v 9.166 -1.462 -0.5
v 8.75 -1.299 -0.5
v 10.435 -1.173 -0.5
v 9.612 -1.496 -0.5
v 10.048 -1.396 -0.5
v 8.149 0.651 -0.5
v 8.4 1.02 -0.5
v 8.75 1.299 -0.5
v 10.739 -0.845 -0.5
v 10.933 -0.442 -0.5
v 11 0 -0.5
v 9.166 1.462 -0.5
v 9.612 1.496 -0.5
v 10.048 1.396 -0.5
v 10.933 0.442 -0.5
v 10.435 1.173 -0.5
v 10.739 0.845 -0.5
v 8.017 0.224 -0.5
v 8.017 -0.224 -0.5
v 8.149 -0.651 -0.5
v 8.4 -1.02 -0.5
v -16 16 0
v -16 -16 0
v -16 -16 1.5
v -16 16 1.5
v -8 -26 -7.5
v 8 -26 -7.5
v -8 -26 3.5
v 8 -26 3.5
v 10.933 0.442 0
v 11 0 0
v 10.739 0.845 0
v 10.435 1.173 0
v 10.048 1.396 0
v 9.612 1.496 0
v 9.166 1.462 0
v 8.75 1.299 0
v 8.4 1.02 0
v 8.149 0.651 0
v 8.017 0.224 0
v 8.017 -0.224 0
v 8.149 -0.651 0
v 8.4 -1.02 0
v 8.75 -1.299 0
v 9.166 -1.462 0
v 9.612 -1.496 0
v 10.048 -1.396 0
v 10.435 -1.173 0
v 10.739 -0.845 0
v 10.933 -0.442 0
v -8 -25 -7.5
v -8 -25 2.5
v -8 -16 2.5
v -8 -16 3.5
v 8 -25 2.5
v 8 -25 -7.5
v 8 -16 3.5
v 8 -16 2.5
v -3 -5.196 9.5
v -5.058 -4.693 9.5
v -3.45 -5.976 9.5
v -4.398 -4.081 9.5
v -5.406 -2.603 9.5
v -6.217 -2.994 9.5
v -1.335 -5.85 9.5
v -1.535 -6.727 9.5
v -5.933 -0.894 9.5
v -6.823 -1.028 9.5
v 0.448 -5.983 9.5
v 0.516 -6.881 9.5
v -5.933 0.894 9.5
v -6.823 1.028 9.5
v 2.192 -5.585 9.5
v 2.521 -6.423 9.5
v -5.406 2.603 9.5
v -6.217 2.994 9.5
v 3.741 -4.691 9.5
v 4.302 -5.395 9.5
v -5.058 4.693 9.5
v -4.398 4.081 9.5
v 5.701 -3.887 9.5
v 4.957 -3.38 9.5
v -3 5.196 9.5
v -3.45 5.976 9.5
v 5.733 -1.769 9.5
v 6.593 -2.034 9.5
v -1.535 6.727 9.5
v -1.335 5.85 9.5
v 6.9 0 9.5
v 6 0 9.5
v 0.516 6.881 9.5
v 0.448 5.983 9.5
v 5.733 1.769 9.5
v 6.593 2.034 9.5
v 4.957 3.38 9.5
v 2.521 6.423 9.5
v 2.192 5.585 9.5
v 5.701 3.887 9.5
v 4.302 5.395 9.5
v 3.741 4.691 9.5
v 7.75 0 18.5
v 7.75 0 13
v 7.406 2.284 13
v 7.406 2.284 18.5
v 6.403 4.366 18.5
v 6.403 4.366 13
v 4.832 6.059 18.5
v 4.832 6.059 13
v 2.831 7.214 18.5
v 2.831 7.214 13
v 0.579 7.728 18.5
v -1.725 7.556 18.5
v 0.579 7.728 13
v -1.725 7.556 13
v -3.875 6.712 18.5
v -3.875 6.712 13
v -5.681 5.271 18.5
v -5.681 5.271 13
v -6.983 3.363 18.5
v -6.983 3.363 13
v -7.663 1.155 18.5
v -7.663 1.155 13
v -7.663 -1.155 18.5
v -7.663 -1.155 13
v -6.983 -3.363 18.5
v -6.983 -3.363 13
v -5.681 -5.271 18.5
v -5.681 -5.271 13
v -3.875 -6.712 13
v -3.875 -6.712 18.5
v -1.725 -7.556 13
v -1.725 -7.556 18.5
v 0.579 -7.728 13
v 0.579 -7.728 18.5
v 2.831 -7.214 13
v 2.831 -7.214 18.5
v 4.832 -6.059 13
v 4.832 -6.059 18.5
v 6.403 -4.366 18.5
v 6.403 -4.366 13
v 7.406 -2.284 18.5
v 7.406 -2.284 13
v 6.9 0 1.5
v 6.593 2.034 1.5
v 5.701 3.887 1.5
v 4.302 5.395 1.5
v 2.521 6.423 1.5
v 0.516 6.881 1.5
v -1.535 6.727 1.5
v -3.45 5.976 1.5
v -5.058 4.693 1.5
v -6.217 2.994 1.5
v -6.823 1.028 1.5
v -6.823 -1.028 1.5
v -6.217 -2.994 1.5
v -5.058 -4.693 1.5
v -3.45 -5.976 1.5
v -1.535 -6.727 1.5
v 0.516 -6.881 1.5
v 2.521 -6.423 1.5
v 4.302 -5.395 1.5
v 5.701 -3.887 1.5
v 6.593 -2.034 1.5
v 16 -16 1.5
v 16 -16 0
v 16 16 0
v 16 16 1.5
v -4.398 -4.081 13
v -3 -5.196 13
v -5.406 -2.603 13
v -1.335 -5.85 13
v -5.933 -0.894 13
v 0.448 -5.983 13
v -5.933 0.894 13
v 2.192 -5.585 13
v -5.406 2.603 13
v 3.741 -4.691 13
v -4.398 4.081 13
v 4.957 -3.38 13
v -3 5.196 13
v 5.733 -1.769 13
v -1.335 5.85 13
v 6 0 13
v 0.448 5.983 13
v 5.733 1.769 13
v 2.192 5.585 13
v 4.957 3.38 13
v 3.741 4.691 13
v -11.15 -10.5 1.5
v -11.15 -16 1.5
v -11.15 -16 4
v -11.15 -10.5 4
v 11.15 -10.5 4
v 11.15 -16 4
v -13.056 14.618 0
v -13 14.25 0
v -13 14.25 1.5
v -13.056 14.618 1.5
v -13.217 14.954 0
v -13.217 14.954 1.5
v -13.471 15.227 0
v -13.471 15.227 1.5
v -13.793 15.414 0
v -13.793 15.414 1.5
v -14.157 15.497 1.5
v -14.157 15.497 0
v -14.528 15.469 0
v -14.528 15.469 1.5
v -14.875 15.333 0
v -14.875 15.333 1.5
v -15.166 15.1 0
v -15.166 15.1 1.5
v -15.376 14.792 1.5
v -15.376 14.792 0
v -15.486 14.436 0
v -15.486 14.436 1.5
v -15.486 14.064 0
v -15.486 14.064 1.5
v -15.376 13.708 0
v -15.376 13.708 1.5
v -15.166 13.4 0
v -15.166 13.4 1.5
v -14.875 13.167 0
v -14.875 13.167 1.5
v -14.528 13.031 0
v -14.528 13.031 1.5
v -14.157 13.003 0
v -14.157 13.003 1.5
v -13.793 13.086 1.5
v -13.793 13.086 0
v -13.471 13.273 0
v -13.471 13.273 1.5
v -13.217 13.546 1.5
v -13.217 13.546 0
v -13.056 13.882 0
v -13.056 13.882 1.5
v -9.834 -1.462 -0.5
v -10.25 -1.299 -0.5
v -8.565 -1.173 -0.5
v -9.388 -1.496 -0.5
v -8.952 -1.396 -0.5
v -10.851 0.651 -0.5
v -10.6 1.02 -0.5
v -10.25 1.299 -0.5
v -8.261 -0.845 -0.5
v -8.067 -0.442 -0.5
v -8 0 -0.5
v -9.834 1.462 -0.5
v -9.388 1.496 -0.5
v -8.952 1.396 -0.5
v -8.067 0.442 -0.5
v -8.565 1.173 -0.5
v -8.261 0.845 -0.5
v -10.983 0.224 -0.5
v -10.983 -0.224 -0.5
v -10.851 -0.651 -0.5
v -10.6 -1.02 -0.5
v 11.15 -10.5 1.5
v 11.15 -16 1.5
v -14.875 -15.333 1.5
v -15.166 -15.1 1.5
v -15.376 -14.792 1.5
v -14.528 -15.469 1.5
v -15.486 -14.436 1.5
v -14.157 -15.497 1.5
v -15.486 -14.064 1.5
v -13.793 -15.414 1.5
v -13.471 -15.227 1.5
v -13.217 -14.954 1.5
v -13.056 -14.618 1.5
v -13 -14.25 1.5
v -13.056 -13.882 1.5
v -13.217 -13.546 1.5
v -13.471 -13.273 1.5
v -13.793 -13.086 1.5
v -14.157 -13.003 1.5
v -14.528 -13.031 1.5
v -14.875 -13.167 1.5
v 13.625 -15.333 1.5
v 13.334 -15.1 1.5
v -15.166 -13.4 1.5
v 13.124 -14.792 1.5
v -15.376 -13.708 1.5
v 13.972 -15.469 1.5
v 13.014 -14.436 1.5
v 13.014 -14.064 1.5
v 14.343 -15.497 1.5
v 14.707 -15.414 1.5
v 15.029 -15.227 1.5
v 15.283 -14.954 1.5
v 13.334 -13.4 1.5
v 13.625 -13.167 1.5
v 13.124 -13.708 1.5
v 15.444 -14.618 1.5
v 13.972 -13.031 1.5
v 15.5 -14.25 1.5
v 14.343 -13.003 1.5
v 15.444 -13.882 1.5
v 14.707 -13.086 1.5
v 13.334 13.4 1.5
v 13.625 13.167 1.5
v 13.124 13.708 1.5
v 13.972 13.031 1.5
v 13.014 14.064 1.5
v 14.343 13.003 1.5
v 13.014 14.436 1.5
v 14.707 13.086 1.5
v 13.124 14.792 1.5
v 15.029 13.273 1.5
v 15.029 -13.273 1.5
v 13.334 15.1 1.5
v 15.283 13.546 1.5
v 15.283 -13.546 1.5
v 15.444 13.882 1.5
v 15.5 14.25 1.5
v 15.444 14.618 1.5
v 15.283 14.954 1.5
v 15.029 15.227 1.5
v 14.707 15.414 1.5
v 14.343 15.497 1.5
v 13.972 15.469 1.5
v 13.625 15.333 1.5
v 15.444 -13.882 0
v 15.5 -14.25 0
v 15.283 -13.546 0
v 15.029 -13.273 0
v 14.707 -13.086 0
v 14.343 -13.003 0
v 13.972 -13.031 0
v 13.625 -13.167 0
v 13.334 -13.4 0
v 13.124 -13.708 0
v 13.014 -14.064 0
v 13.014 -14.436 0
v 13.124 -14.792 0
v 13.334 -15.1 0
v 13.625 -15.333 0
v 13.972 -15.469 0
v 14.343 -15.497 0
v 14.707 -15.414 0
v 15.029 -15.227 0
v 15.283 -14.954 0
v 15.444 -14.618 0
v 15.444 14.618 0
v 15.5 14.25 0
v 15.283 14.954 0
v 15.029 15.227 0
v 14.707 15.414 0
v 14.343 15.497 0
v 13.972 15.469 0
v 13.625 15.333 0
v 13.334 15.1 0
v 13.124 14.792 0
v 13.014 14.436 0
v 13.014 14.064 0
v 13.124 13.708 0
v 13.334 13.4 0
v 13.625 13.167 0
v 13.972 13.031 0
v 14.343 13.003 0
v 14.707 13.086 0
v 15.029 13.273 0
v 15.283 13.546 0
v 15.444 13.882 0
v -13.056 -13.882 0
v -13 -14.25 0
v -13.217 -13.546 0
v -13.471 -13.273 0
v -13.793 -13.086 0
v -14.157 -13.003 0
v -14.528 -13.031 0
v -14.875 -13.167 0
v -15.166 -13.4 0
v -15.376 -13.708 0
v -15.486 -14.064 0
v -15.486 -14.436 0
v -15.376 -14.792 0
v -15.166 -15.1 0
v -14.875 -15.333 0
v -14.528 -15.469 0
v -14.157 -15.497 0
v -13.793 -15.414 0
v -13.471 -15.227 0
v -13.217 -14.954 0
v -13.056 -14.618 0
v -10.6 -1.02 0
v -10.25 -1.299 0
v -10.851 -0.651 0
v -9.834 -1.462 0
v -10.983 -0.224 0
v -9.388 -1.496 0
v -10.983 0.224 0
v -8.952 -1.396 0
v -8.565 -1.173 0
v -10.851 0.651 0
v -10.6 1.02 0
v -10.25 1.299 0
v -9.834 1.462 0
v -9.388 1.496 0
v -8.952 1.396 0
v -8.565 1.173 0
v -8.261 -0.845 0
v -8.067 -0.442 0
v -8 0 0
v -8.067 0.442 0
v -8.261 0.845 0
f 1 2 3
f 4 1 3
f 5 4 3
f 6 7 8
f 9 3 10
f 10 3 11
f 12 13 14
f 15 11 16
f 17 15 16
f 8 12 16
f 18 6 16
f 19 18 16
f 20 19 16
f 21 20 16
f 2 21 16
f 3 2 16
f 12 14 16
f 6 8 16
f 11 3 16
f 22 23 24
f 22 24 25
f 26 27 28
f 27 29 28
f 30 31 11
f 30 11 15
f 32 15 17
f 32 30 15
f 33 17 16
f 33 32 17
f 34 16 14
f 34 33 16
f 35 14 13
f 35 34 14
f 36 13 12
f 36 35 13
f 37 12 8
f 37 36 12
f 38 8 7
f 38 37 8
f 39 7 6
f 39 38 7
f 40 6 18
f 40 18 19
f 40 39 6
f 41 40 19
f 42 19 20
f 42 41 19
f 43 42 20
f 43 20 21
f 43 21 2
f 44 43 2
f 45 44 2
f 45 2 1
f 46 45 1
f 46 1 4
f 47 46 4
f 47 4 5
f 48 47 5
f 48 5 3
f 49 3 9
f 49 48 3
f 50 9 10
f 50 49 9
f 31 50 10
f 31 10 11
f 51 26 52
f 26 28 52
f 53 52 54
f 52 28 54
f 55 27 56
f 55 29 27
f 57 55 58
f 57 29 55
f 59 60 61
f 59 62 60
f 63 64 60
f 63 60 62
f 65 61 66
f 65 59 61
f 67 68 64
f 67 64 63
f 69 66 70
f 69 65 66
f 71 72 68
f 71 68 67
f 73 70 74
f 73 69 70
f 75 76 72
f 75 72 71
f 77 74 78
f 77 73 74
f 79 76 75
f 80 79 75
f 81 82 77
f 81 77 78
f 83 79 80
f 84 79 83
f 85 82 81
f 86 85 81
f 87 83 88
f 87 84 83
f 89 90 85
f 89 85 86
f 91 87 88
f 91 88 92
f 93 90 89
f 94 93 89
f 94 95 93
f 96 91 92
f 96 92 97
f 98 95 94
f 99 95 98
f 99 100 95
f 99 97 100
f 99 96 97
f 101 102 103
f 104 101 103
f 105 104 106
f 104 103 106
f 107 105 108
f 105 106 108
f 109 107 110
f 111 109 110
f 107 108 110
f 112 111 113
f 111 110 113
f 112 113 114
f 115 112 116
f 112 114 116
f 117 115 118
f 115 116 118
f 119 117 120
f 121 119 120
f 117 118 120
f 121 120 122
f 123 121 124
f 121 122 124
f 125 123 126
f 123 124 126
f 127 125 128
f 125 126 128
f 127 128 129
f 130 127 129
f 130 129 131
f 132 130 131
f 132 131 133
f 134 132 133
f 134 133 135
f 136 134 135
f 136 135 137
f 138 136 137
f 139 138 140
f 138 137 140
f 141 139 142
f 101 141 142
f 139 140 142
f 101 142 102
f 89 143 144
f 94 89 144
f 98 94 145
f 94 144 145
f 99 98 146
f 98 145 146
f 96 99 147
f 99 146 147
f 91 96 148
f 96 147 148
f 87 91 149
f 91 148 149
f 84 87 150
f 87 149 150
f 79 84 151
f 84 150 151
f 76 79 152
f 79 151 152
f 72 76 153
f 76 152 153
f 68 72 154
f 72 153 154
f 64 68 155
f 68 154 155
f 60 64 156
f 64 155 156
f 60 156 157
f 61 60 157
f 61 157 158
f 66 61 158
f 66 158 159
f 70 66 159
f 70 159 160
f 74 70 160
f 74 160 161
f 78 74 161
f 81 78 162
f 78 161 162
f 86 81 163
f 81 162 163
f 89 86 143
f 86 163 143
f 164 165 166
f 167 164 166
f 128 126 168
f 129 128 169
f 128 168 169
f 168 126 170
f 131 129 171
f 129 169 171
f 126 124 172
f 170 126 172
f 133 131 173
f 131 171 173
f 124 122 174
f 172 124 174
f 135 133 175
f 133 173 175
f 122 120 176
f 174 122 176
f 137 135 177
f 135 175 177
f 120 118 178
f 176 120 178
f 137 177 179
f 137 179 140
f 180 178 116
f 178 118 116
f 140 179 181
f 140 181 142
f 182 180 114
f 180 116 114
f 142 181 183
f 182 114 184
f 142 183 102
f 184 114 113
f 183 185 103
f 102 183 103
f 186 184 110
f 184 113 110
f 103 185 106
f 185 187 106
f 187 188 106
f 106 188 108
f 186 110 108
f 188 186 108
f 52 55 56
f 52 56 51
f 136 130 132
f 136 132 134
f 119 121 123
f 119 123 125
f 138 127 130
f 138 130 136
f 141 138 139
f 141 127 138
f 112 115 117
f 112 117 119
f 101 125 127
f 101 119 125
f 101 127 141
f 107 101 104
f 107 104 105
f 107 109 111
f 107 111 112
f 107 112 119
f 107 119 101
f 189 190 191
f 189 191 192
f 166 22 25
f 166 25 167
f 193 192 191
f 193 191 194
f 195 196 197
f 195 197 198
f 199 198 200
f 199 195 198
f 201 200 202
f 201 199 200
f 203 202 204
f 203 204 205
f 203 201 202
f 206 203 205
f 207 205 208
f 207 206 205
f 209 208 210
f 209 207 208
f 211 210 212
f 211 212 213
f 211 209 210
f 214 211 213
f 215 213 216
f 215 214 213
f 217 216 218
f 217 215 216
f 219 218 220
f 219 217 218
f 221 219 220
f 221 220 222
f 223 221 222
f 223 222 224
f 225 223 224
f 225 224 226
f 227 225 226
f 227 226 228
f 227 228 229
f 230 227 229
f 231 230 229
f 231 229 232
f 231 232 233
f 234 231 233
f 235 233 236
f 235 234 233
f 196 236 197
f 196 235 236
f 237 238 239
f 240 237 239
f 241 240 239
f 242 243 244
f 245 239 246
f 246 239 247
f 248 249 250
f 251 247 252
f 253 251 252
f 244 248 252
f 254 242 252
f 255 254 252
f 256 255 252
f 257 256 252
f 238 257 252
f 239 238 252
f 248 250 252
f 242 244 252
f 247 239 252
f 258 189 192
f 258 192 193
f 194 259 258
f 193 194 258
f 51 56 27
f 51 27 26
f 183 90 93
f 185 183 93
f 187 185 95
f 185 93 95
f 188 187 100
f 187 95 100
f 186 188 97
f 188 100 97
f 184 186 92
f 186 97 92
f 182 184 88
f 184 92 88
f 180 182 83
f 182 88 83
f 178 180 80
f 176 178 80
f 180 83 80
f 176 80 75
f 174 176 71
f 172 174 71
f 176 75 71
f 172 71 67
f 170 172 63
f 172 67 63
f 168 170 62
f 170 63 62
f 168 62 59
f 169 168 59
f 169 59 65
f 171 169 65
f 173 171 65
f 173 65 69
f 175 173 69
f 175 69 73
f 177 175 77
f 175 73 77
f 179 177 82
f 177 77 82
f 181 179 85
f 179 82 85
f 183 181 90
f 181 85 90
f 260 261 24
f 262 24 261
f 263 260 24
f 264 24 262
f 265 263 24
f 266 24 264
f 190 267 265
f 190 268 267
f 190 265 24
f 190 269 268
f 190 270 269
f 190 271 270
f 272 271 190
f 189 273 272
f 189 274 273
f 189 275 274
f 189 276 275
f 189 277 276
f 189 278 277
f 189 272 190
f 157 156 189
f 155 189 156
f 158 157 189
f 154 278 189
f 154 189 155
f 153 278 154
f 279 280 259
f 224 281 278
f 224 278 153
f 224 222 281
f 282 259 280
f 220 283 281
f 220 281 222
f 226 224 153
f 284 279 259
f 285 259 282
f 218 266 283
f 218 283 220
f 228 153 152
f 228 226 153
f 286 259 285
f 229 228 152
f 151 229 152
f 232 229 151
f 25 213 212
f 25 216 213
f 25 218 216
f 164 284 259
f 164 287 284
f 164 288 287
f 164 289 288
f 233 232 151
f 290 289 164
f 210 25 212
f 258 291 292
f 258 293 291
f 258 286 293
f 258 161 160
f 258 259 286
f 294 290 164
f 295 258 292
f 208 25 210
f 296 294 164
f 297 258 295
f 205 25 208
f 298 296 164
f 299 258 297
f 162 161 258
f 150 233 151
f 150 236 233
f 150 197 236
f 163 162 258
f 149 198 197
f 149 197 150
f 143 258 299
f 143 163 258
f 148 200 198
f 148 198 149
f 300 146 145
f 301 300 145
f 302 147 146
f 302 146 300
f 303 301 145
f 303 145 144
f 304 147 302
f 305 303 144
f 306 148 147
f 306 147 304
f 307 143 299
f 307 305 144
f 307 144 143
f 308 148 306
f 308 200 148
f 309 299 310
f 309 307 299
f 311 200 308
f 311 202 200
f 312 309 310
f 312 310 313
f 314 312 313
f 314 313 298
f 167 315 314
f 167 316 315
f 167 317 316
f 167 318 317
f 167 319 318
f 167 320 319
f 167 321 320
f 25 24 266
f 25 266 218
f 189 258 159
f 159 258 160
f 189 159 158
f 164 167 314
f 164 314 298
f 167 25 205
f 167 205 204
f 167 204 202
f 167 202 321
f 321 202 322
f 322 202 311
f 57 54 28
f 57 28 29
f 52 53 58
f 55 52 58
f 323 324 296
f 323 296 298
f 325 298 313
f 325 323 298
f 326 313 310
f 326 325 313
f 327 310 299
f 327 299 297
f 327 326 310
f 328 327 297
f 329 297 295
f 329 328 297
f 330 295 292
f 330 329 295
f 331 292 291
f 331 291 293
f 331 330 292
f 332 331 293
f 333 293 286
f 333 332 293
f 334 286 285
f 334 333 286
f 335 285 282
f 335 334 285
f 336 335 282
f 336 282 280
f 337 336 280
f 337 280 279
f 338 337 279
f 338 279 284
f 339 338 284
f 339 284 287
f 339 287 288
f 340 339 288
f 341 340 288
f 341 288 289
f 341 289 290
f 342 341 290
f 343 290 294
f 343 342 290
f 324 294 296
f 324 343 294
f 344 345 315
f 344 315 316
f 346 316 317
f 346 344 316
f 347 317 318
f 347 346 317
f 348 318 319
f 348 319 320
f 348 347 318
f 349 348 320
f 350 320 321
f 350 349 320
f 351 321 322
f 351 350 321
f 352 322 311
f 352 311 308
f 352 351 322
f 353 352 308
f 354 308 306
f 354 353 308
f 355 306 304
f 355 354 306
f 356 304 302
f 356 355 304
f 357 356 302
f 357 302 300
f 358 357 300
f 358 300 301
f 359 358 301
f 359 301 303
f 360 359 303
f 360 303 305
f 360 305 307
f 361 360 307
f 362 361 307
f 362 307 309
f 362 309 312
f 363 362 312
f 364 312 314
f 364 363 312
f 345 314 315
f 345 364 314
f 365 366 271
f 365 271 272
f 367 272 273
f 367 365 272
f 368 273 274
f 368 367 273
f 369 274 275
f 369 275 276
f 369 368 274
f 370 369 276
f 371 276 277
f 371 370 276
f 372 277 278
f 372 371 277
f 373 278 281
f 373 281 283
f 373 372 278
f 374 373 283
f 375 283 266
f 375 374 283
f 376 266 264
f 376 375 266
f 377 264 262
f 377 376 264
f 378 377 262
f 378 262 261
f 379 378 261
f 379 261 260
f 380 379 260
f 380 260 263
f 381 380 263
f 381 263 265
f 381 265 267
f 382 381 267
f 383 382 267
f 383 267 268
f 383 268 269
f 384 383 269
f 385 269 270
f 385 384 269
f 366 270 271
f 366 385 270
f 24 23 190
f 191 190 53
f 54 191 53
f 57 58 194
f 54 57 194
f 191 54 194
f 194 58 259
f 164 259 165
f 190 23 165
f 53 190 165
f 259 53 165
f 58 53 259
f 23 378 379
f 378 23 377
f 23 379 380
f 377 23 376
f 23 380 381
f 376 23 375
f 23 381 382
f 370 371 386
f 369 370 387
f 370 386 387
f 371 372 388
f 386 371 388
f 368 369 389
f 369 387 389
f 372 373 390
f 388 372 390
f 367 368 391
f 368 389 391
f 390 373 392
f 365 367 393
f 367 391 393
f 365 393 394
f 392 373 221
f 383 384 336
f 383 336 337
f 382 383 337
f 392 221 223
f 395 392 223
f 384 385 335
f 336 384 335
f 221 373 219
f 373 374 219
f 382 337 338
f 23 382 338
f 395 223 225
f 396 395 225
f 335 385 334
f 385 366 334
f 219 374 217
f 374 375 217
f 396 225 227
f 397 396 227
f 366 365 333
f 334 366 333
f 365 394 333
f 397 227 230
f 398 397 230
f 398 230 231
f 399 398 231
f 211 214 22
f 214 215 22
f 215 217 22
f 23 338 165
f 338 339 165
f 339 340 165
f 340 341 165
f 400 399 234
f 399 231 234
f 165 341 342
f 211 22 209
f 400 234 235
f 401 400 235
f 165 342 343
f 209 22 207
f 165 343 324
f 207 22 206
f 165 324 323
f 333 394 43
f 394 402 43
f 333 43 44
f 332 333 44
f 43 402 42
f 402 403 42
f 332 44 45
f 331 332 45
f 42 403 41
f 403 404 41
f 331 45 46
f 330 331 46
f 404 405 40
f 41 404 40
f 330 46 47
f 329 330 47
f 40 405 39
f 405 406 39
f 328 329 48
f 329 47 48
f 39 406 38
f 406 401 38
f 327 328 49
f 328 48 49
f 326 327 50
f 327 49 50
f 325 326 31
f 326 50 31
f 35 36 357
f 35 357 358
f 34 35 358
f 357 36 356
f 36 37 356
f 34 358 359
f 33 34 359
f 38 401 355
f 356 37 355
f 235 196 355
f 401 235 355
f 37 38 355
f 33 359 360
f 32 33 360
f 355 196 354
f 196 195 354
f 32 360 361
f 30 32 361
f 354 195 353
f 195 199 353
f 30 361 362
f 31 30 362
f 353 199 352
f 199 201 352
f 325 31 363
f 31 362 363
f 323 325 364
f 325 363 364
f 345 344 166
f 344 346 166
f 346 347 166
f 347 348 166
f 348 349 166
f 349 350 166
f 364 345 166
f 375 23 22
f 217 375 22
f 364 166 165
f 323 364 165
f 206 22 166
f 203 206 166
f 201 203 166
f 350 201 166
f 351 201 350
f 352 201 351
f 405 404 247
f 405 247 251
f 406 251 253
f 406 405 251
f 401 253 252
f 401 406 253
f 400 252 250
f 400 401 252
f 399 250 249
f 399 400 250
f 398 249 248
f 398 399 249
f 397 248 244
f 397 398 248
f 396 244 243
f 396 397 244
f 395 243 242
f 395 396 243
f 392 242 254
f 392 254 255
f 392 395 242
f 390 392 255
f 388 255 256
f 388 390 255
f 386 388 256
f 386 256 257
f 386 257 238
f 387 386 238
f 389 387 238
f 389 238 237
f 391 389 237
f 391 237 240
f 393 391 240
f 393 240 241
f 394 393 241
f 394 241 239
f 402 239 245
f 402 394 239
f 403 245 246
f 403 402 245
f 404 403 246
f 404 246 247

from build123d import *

# Parameters (mm, degrees)
SKETCH_1_W         = 32
SKETCH_1_H         = 32
SKETCH_1_R         = 1.25
EXTRUDE_1463_DEPTH = 1.5
EXTRUDE_START      = 1.5
SKETCH_1_3_W       = 22.3
SKETCH_1_3_H       = 5.5
EXTRUDE_1638_DEPTH = 2.5
SKETCH_1_4_R       = 6.9
SKETCH_1_4_R_2     = 6
EXTRUDE_1808_DEPTH = 8
EXTRUDE_START_2    = 9.5
SKETCH_1_5_R       = 6
EXTRUDE_1980_DEPTH = 3.5
EXTRUDE_START_3    = 13
SKETCH_1_6_R       = 7.75
SKETCH_1_6_R_2     = 6.9
SKETCH_1_6_R_3     = 6
EXTRUDE_2074_DEPTH = 5.5
SKETCH_1_7_R       = 1.5
EXTRUDE_2255_DEPTH = 0.5
SKETCH_2_W         = 16
SKETCH_2_H         = 1
EXTRUDE_2715_DEPTH = 10
SKETCH_3_W         = 16
SKETCH_3_H         = 1
EXTRUDE_3012_DEPTH = 10


with BuildPart() as part:
    # Эскиз1 → Extrude 1463 (new body)
    with BuildSketch(Plane.XY):
        Rectangle(SKETCH_1_W, SKETCH_1_H)
        with Locations((-14.25, -14.25)):
            Circle(SKETCH_1_R, mode=Mode.SUBTRACT)
        with Locations((14.25, -14.25)):
            Circle(SKETCH_1_R, mode=Mode.SUBTRACT)
        with Locations((-14.25, 14.25)):
            Circle(SKETCH_1_R, mode=Mode.SUBTRACT)
        with Locations((14.25, 14.25)):
            Circle(SKETCH_1_R, mode=Mode.SUBTRACT)
    extrude(amount=EXTRUDE_1463_DEPTH)

    # Эскиз1<3> → Extrude 1638 (add)
    with BuildSketch(Plane.XY.offset(EXTRUDE_START)):
        with Locations((0, -13.25)):
            Rectangle(SKETCH_1_3_W, SKETCH_1_3_H)
    extrude(amount=EXTRUDE_1638_DEPTH)

    # Эскиз1<4> → Extrude 1808 (add)
    # profile 1 of 2: a face of its own
    with BuildSketch(Plane.XY.offset(EXTRUDE_START)):
        Circle(SKETCH_1_4_R)
        Circle(SKETCH_1_4_R_2, mode=Mode.SUBTRACT)
    # profile 2 of 2: a face of its own
    with BuildSketch(Plane.XY.offset(EXTRUDE_START)):
        Circle(SKETCH_1_4_R_2)
    extrude(amount=EXTRUDE_1808_DEPTH)

    # Эскиз1<5> → Extrude 1980 (add)
    with BuildSketch(Plane.XY.offset(EXTRUDE_START_2)):
        Circle(SKETCH_1_5_R)
    extrude(amount=EXTRUDE_1980_DEPTH)

    # Эскиз1<6> → Extrude 2074 (add)
    # profile 1 of 3: a face of its own
    with BuildSketch(Plane.XY.offset(EXTRUDE_START_3)):
        Circle(SKETCH_1_6_R)
        Circle(SKETCH_1_6_R_2, mode=Mode.SUBTRACT)
    # profile 2 of 3: a face of its own
    with BuildSketch(Plane.XY.offset(EXTRUDE_START_3)):
        Circle(SKETCH_1_6_R_2)
        Circle(SKETCH_1_6_R_3, mode=Mode.SUBTRACT)
    # profile 3 of 3: a face of its own
    with BuildSketch(Plane.XY.offset(EXTRUDE_START_3)):
        Circle(SKETCH_1_6_R_3)
    extrude(amount=EXTRUDE_2074_DEPTH)

    # Эскиз1<7> → Extrude 2255 (add)
    with BuildSketch(Plane.XY):
        with Locations((9.5, 0)):
            Circle(SKETCH_1_7_R)
        with Locations((-9.5, 0)):
            Circle(SKETCH_1_7_R)
    extrude(amount=-EXTRUDE_2255_DEPTH)

    # Эскиз2 → Extrude 2715 (add)
    with BuildSketch(Plane.XZ.offset(16)):
        with Locations((0, 3)):
            Rectangle(SKETCH_2_W, SKETCH_2_H)
    extrude(amount=EXTRUDE_2715_DEPTH)

    # Эскиз3 → Extrude 3012 (add)
    with BuildSketch(Plane(origin=(0, 0, 2.5), x_dir=(-1, 0, 0), z_dir=(0, 0, -1))):
        with Locations((0, -25.5)):
            Rectangle(SKETCH_3_W, SKETCH_3_H)
    extrude(amount=EXTRUDE_3012_DEPTH)


solid = part.part
